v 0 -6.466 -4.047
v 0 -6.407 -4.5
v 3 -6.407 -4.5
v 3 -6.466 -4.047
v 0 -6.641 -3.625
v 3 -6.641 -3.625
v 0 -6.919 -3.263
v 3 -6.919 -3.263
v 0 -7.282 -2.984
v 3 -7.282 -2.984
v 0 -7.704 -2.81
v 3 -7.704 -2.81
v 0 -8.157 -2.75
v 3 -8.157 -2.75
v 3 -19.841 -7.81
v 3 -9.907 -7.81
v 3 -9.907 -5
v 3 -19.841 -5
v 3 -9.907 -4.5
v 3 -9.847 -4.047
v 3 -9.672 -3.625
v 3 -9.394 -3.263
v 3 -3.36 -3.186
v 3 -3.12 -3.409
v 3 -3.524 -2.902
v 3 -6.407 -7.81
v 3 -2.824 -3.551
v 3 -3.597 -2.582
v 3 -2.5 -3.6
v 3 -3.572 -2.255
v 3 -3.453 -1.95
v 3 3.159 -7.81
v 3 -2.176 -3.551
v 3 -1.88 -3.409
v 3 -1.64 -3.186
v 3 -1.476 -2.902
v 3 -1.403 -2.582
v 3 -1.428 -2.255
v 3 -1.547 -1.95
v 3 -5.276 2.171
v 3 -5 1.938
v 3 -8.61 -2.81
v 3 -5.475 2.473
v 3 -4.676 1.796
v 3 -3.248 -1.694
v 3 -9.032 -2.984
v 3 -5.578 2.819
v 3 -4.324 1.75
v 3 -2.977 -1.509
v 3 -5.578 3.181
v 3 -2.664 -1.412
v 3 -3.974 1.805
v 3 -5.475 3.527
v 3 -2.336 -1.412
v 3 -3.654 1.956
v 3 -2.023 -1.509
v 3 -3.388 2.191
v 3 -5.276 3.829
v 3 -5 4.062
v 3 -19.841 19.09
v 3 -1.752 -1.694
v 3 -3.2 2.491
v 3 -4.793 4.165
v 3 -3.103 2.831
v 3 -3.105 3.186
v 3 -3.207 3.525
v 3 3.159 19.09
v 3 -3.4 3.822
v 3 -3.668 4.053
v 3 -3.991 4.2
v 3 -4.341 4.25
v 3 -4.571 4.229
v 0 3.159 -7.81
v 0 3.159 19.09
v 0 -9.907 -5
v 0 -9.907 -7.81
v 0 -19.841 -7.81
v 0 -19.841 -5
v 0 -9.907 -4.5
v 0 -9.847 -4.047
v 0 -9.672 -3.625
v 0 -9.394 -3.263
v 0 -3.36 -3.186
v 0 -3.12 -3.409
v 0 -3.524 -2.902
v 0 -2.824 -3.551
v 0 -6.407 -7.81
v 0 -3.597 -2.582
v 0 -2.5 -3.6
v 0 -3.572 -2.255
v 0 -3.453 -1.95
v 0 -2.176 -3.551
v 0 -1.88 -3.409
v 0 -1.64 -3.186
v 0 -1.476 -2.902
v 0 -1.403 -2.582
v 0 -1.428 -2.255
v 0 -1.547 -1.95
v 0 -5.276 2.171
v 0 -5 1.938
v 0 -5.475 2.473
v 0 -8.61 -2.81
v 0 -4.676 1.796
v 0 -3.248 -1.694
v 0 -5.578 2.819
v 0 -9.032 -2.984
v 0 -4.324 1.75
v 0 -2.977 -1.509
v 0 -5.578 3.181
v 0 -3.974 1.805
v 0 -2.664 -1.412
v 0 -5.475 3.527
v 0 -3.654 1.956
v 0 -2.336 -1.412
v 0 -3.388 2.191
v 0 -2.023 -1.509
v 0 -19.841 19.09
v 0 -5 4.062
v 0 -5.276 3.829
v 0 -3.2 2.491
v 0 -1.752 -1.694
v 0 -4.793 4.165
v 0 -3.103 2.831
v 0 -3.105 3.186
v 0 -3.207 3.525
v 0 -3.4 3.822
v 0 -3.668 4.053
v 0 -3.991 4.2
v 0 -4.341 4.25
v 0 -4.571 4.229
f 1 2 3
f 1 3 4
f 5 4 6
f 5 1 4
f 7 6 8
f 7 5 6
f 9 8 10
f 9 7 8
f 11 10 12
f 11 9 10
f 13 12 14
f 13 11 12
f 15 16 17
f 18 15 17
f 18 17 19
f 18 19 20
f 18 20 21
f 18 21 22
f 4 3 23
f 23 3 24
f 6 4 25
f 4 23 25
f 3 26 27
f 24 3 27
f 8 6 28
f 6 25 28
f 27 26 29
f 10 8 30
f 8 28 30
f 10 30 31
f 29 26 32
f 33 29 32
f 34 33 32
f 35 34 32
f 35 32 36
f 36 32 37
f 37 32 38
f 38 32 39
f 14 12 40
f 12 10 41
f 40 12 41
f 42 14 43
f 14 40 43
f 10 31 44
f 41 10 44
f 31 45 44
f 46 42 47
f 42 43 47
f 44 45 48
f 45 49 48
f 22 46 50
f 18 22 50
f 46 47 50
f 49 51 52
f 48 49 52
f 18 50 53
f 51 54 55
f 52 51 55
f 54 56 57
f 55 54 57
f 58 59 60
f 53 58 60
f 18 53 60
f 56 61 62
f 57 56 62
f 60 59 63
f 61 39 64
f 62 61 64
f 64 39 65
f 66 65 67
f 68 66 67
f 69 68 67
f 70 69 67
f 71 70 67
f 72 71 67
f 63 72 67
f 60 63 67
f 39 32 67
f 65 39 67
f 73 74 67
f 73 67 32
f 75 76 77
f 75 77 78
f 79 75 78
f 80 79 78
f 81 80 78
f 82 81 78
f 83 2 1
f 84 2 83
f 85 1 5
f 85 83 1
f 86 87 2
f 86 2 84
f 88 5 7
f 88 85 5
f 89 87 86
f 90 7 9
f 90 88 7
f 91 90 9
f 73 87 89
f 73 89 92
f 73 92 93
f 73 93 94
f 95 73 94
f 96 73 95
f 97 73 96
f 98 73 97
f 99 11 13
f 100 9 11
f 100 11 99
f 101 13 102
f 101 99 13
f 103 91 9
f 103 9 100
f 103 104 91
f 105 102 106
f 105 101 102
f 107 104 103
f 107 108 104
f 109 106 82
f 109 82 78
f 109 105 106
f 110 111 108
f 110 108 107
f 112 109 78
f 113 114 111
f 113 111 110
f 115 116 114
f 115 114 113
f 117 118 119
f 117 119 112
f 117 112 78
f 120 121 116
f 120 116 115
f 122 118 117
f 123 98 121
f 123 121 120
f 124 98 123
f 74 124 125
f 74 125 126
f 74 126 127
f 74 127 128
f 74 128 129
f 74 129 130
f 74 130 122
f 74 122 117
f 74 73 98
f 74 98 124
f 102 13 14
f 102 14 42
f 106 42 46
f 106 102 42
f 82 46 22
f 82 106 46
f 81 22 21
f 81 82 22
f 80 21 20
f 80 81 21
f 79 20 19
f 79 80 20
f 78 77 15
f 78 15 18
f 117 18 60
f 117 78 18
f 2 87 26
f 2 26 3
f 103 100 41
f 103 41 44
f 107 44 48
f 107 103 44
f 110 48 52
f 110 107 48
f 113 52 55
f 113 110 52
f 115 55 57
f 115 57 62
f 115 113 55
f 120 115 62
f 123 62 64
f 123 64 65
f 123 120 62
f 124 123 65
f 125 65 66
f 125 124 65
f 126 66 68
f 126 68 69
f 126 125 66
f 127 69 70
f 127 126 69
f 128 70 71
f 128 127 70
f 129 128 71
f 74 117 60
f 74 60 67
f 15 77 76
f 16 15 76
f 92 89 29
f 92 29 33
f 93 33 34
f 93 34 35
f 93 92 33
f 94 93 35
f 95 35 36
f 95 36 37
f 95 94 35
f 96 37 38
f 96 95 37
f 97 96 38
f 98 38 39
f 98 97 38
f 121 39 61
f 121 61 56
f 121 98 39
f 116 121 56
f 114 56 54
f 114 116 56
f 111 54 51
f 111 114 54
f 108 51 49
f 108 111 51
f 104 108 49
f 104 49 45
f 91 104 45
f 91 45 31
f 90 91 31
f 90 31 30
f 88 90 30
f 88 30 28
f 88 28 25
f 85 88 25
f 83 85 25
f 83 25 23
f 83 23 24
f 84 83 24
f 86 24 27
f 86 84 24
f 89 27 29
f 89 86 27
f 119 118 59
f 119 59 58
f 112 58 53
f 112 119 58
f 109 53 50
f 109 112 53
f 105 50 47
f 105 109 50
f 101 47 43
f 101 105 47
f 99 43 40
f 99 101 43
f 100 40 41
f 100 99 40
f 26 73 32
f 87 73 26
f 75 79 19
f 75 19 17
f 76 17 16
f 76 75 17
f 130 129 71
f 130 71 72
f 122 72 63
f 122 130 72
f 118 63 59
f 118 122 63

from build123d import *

# Parameters (mm, degrees)
SKETCH_1_W      = 5
SKETCH_1_H      = 5
SKETCH_1_R      = 1.1
EXTRUDE_1_DEPTH = 3
SKETCH_2_W      = 2.809830056
SKETCH_2_H      = 3.158804736
SKETCH_2_H_2    = 9.934341015
EXTRUDE_2_DEPTH = 3


with BuildPart() as part:
    # 草图1 → 凸台-拉伸1 (new body)
    with BuildSketch(Plane(origin=(0, 0, 0), x_dir=(0, 0, -1), z_dir=(1, 0, 0))):
        with Locations((2.5, -2.5)):
            Rectangle(SKETCH_1_W, SKETCH_1_H)
        with Locations((2.5, -2.5)):
            Circle(SKETCH_1_R, mode=Mode.SUBTRACT)
    extrude(amount=EXTRUDE_1_DEPTH)

    # 草图2 → 凸台-拉伸2 (add)
    with BuildSketch(Plane.ZY):
        with Locations((-6.404915028, 1.579402368)):
            Rectangle(SKETCH_2_W, SKETCH_2_H)
        Polygon((-5, 3.158804736), (-5, 0), (0, 0), (19.090169944, 0), (19.090169944, 3.158804736), align=None)
        Polygon((-5, -5), (-5, 0), (-7.809830056, 0), (-7.809830056, -6.406854249), (-5, -6.406854249), align=None)
        with BuildLine():
            Line((0, -5), (-5, -5))
            Line((-5, -5), (-5, -6.406854249))
            Line((-5, -6.406854249), (-4.5, -6.406854249))
            ThreePointArc((-4.5, -6.406854249), (-3.262563133, -6.919417382), (-2.75, -8.156854249))
            ThreePointArc((-2.75, -8.156854249), (-3.262563133, -9.394291117), (-4.5, -9.906854249))
            Line((-4.5, -9.906854249), (-5, -9.906854249))
            Line((-5, -9.906854249), (-5, -19.841195264))
            Line((-5, -19.841195264), (19.090169944, -19.841195264))
            Line((19.090169944, -19.841195264), (19.090169944, -5))
            Line((19.090169944, -5), (4.062297661, -5))
            ThreePointArc((4.062297661, -5), (3, -5.591195264), (1.937702339, -5))
            Line((1.937702339, -5), (0, -5))
        make_face()
        with BuildLine():
            Line((19.090169944, 0), (0, 0))
            Line((0, 0), (0, -5))
            Line((0, -5), (1.937702339, -5))
            ThreePointArc((1.937702339, -5), (2.657488742, -3.139036357), (4.25, -4.341195264))
            ThreePointArc((4.25, -4.341195264), (4.202158907, -4.683706522), (4.062297661, -5))
            Line((4.062297661, -5), (19.090169944, -5))
            Line((19.090169944, -5), (19.090169944, 0))
        make_face()
        with Locations((-6.404915028, -14.874024756)):
            Rectangle(SKETCH_2_W, SKETCH_2_H_2)
    extrude(amount=-EXTRUDE_2_DEPTH)


solid = part.part
